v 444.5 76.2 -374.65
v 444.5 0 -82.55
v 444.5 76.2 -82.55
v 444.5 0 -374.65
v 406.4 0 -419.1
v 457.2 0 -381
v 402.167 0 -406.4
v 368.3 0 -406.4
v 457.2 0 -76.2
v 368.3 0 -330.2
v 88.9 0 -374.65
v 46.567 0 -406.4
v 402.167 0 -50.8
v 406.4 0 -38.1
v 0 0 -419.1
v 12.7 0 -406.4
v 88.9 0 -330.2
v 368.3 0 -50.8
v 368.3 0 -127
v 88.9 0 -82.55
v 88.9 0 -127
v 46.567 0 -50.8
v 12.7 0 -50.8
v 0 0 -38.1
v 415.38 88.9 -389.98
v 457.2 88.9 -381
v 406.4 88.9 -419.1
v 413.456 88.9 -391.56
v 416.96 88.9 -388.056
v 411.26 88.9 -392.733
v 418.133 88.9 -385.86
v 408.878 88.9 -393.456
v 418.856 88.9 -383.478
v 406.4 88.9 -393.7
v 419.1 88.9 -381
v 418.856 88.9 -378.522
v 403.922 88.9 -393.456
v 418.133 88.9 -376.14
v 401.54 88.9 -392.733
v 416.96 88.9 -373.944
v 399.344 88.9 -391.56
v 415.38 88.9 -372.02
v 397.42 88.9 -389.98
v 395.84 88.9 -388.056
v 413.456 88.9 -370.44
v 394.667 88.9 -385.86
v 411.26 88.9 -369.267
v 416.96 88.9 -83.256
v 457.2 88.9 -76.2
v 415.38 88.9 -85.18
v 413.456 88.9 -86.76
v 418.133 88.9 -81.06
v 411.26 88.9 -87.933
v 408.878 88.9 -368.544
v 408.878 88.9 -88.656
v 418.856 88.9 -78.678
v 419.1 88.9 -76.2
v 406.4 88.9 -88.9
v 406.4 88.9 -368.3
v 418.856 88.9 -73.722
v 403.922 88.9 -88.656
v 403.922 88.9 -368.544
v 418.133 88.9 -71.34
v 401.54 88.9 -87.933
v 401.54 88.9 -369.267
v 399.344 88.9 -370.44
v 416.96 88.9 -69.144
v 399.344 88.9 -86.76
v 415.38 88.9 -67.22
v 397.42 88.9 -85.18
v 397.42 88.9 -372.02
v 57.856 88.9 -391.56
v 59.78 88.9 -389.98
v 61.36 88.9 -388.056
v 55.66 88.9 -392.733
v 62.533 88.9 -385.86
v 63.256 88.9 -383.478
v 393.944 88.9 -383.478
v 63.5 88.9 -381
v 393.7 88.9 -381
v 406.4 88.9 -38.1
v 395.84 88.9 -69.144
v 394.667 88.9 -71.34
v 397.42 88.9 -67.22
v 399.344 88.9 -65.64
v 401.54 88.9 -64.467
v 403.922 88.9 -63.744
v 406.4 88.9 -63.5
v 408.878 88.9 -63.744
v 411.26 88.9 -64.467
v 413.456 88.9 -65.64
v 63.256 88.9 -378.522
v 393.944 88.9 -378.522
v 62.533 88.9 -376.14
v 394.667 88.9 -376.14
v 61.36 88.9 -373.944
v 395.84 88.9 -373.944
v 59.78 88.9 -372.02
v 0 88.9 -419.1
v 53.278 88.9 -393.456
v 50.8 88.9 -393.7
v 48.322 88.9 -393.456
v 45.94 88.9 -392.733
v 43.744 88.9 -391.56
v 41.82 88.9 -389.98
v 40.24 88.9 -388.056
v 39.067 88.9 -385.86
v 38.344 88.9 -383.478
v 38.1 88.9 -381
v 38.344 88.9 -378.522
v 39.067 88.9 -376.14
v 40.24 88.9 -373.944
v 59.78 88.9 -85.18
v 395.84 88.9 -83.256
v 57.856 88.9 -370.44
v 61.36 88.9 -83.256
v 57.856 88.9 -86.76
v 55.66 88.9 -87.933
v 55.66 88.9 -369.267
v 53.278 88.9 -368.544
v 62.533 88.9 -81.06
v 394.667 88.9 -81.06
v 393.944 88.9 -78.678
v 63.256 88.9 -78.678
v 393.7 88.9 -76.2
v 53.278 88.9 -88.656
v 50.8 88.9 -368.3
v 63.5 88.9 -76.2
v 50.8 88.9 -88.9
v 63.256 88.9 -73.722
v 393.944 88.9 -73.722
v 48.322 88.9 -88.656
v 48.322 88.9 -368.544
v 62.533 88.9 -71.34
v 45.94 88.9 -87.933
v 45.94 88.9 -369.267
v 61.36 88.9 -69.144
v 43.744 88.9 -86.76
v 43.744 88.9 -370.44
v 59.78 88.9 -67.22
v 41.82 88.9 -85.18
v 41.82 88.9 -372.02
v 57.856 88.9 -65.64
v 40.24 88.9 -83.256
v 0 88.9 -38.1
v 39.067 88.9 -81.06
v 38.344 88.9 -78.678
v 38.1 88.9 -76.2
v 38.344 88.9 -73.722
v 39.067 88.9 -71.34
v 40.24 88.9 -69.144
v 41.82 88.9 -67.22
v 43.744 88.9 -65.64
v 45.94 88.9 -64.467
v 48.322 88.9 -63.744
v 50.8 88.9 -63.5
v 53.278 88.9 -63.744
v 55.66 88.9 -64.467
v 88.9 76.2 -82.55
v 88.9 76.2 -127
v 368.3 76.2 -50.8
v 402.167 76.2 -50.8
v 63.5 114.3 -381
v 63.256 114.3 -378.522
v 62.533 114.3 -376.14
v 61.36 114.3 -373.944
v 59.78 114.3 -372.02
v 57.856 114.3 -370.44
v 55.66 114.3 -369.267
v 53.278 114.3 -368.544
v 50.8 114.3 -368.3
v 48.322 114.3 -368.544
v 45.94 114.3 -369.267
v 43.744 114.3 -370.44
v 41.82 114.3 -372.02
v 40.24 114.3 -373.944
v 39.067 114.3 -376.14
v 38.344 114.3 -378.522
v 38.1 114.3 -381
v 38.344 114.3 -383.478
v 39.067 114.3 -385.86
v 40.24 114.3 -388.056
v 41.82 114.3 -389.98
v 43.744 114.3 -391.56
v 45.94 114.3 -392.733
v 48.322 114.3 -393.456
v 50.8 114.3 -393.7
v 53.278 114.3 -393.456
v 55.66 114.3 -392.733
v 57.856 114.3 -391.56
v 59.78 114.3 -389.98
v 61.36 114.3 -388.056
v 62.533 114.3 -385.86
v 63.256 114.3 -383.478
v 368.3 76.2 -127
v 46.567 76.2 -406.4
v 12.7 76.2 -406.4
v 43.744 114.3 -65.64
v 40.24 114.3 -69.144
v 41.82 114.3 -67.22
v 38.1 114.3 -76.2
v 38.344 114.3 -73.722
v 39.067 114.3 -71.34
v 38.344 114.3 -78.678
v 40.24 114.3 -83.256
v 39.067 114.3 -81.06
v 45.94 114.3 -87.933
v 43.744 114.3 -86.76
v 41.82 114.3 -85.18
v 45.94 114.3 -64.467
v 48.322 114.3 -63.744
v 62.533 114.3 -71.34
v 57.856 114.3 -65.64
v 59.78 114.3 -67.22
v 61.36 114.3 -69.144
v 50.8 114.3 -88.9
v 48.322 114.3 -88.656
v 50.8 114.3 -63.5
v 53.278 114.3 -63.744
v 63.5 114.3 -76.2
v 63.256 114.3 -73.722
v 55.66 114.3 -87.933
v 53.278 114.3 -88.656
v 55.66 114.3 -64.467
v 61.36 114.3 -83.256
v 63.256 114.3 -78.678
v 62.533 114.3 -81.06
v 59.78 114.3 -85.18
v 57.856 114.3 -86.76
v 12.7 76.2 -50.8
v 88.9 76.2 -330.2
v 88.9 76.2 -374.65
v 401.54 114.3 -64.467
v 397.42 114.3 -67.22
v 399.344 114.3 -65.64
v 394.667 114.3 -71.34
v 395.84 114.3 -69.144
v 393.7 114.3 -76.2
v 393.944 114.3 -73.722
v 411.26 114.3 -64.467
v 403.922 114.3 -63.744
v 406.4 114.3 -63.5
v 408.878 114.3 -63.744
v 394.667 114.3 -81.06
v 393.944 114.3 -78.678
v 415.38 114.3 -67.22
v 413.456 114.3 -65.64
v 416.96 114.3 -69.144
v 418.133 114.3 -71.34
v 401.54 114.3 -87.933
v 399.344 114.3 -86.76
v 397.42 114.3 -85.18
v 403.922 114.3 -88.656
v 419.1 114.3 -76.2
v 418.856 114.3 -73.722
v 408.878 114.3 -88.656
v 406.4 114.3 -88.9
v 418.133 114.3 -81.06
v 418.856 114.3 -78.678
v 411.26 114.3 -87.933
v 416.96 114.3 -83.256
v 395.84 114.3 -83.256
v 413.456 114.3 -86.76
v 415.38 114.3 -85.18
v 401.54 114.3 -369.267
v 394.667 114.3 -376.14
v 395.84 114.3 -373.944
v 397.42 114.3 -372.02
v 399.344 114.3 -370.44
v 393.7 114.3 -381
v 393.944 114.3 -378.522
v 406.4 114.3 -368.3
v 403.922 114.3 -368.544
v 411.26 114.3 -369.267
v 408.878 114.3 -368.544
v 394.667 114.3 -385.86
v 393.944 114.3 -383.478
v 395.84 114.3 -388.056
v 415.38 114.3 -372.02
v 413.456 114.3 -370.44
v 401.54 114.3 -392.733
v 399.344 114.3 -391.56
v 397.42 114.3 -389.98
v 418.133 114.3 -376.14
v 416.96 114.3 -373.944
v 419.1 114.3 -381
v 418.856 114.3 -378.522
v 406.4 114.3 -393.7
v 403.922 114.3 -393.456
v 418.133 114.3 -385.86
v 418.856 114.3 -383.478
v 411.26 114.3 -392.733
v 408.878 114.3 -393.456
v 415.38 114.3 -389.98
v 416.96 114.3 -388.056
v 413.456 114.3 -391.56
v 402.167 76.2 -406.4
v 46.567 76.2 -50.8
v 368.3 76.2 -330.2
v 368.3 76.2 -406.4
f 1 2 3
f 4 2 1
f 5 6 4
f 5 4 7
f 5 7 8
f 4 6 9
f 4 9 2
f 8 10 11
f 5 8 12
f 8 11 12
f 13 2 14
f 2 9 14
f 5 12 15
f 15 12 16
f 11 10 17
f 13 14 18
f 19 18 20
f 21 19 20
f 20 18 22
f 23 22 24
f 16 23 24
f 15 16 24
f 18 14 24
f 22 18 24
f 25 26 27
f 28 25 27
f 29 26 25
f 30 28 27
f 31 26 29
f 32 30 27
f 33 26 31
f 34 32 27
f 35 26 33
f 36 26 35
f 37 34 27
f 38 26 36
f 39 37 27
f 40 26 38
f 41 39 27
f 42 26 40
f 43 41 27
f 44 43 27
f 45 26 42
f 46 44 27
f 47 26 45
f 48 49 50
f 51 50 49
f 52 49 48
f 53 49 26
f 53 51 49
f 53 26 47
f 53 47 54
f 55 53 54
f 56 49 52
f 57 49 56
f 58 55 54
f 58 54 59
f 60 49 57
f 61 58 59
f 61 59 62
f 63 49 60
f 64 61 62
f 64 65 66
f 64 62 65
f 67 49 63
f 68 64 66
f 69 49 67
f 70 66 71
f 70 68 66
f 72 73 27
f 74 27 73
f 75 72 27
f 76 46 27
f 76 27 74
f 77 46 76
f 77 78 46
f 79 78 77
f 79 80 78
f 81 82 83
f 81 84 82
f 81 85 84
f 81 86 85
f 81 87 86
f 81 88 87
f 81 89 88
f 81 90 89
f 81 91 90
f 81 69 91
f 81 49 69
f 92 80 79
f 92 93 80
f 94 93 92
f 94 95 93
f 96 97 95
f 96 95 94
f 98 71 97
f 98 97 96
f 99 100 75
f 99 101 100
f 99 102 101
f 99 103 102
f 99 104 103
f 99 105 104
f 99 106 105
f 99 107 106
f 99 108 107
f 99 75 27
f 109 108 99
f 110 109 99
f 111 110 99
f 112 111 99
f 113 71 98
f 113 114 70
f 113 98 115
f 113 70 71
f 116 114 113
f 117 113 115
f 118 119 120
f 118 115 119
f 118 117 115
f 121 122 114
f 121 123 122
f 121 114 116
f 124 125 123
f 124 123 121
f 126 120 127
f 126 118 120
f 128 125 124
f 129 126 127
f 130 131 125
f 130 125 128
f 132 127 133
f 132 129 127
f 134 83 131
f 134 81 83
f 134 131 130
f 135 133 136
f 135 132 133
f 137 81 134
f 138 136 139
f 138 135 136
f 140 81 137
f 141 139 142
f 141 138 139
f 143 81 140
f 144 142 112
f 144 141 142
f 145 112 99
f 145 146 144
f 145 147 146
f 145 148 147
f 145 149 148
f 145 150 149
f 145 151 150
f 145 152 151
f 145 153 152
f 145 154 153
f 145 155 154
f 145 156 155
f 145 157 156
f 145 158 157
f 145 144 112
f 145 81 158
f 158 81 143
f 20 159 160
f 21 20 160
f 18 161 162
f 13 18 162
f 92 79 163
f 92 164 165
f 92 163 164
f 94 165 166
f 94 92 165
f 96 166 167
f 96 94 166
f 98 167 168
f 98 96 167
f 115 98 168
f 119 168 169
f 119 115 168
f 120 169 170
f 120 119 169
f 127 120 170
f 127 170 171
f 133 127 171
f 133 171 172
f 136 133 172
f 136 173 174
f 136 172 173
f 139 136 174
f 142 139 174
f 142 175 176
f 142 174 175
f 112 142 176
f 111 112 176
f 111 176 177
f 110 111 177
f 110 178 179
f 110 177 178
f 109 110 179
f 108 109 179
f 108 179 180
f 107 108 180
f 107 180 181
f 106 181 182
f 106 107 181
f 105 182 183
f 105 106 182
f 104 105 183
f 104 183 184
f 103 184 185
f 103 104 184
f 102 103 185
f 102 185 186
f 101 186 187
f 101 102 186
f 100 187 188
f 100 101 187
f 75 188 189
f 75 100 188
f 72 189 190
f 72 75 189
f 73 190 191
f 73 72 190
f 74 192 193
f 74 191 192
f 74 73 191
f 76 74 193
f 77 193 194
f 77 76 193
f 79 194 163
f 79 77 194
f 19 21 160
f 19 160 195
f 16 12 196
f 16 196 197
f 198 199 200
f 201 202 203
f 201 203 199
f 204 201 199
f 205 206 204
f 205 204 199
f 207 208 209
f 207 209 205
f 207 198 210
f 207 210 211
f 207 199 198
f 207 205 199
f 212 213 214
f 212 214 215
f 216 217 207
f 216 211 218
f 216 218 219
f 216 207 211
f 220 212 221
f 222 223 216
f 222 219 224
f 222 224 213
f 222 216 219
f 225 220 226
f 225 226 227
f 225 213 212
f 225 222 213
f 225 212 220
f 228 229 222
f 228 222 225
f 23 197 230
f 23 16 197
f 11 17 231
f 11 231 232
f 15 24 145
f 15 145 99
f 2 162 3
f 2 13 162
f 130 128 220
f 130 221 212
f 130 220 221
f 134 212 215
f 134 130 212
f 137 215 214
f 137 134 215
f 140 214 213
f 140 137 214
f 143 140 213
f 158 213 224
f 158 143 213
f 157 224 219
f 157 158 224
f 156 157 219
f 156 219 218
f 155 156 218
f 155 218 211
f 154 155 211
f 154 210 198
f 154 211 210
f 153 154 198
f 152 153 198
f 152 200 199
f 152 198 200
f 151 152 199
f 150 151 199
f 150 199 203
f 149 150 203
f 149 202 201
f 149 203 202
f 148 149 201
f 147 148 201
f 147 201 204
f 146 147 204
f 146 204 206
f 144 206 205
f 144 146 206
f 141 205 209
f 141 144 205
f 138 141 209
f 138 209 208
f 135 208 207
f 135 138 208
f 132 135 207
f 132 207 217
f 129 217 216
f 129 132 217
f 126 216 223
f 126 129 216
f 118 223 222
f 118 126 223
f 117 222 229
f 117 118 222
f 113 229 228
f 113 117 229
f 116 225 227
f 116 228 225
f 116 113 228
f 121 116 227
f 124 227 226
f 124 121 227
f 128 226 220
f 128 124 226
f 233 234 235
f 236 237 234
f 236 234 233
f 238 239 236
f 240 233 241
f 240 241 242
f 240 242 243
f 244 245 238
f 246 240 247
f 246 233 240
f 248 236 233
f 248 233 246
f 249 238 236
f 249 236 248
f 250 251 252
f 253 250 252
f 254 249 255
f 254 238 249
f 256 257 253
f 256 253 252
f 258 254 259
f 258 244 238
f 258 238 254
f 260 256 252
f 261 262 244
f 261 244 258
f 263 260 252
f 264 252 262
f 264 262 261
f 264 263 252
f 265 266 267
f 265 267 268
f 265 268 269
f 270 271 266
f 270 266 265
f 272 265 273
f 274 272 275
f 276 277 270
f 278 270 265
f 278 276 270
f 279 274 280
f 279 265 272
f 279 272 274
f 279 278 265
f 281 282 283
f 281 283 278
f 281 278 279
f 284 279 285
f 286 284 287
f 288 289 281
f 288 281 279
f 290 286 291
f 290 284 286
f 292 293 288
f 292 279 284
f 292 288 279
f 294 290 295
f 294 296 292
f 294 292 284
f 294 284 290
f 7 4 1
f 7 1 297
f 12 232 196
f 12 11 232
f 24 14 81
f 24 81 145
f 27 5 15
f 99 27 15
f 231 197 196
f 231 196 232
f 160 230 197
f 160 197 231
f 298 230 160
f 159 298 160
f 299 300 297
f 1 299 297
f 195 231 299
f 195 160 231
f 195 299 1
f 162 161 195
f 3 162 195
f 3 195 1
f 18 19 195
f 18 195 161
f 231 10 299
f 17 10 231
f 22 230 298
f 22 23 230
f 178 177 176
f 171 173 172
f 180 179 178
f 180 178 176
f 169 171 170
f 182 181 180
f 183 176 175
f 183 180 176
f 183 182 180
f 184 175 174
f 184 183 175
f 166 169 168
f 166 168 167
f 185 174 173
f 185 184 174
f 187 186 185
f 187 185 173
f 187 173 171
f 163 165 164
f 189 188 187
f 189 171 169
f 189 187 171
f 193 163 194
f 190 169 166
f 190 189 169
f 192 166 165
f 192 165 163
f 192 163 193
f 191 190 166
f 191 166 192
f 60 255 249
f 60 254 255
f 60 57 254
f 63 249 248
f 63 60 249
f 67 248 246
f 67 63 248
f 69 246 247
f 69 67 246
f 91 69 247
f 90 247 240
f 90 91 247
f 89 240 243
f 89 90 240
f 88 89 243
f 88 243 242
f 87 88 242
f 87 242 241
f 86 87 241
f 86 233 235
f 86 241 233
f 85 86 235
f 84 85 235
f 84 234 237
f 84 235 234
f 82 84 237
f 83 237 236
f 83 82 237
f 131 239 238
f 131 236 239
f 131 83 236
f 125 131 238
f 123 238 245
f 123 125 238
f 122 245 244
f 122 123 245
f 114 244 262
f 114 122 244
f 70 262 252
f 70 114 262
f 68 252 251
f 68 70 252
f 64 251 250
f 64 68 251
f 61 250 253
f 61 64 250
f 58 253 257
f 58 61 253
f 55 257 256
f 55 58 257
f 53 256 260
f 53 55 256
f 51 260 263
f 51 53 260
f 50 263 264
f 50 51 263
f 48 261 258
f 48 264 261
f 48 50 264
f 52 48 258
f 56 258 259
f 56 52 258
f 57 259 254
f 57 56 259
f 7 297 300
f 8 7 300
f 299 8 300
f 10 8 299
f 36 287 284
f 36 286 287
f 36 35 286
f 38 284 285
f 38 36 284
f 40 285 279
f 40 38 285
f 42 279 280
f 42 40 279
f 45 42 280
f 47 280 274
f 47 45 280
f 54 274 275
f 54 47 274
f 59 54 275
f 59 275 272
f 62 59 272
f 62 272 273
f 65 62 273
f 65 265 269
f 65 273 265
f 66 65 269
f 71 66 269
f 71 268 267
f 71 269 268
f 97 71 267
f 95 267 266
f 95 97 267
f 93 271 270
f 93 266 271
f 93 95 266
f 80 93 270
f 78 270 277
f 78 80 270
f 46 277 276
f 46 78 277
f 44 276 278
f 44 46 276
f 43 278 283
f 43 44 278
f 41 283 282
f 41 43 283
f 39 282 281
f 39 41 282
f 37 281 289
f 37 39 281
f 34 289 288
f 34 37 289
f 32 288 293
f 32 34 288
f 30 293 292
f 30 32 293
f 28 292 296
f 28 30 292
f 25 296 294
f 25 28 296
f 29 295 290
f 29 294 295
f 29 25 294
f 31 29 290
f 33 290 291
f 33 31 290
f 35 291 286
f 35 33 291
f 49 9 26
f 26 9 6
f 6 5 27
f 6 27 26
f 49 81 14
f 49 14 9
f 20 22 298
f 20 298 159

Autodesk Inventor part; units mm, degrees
ref_plane "YZ Plane" through (0, 0, 0) normal (1, 0, 0) x (0, 1, 0)
ref_plane "XZ Plane" through (0, 0, 0) normal (0, 1, 0) x (-1, 0, 0)
ref_plane "XY Plane" through (0, 0, 0) normal (0, 0, 1) x (1, 0, 0)
sketch "Sketch1" plane through (0, 0, 0) normal (0, 1, 0) x (-1, 0, 0)
  line L0 (0, 0) -> (-457.2, 0) construction
  line L1 (-457.2, -457.2) -> (0, -457.2) construction
  line L2 (0, -457.2) -> (0, 0) construction
  line L3 (0, 0) -> (0, -38.1) construction
  line L4 (0, -457.2) -> (0, -419.1) construction
  line L5 (0, -38.1) -> (0, -371.3712)
  line L6 (-457.2, -76.2) -> (-457.2, -381)
  line L7 (0, -371.3712) -> (0, -419.1)
  line L8 (-406.4, -38.1) -> (-457.2, -76.2)
  line L9 (-406.4, -419.1) -> (-457.2, -381)
  line L10 (-457.2, 0) -> (-457.2, -38.1) construction
  line L11 (-457.2, -76.2) -> (-457.2, -457.2) construction
  line L12 (-444.5, -82.55) -> (-444.5, -374.65)
  line L13 (-444.5, -374.65) -> (-402.1667, -406.4)
  line L14 (-12.7, -406.4) -> (-12.7, -371.3712)
  line L15 (-12.7, -371.3712) -> (-12.7, -50.8)
  line L16 (-402.1667, -50.8) -> (-444.5, -82.55)
  line L17 (-444.5, -82.55) -> (-444.5, -374.65)
  line L18 (-444.5, -374.65) -> (-402.1667, -406.4)
  line L19 (-12.7, -406.4) -> (-12.7, -371.3712)
  line L20 (-12.7, -371.3712) -> (-12.7, -50.8)
  line L21 (-402.1667, -50.8) -> (-444.5, -82.55)
  line L22 (-444.5, -82.55) -> (-444.5, -374.65)
  line L23 (-12.7, -406.4) -> (-12.7, -50.8)
  line L24 (-444.5, -82.55) -> (-444.5, -374.65)
  line L25 (-402.1667, -50.8) -> (-12.7, -50.8)
  line L26 (-406.4, -38.1) -> (0, -38.1)
  line L27 (-406.4, -419.1) -> (0, -419.1)
  line L28 (-402.1667, -406.4) -> (-12.7, -406.4)
  dimension "d0" = 457.2
  dimension "d1" = 457.2
  dimension "d12" = 12.7
  dimension "d13" = 12.7
extrude "Extrusion1" add sketch "Sketch1" along normal blind 88.9 contours L5 L7 L27 L9 L6 L8 L26 | L16 L25 L15 L14 L28 L13 L12
sketch "Sketch2" plane through (0, 0, 0) normal (0, -1, 0) x (1, 0, 0)
  line L0 (0, -38.1) -> (0, -419.1) projected
  line L1 (406.4, -419.1) -> (457.2, -381) projected
  line L2 (457.2, -381) -> (457.2, -76.2) projected
  line L3 (457.2, -76.2) -> (406.4, -38.1) projected
  line L4 (402.1667, -50.8) -> (444.5, -82.55)
  line L5 (444.5, -82.55) -> (444.5, -374.65)
  line L6 (444.5, -374.65) -> (402.1667, -406.4)
  line L7 (402.1667, -406.4) -> (368.3, -406.4)
  line L8 (368.3, -406.4) -> (368.3, -330.2)
  line L9 (368.3, -330.2) -> (88.9, -330.2)
  line L10 (88.9, -330.2) -> (88.9, -374.65)
  line L11 (88.9, -374.65) -> (46.5667, -406.4)
  line L12 (46.5667, -406.4) -> (12.7, -406.4)
  line L13 (12.7, -406.4) -> (12.7, -50.8)
  line L14 (12.7, -50.8) -> (46.5667, -50.8)
  line L15 (46.5667, -50.8) -> (88.9, -82.55)
  line L16 (88.9, -82.55) -> (88.9, -127)
  line L17 (88.9, -127) -> (368.3, -127)
  line L18 (368.3, -127) -> (368.3, -50.8)
  line L19 (368.3, -50.8) -> (402.1667, -50.8)
  line L20 (0, -419.1) -> (406.4, -419.1) projected
  line L21 (406.4, -38.1) -> (0, -38.1) projected
  point P0 (0, 0)
  dimension "d14" = 12.7
extrude "Extrusion2" cut sketch "Sketch2" against normal blind 76.2 contours L4 L5 L6 L7 L8 L9 L10 L11 L12 L13 L14 L15 L16 L17 L18 L19
sketch "Sketch3" plane through (0, 88.9, 0) normal (0, 1, 0) x (1, 0, 0)
  line L0 (0, 419.1) -> (0, 38.1) projected
  line L1 (406.4, 38.1) -> (457.2, 76.2) projected
  line L2 (457.2, 76.2) -> (457.2, 381) projected
  line L3 (457.2, 381) -> (406.4, 419.1) projected
  circle A0 centre (50.8, 76.2) radius 12.7
  circle A1 centre (50.8, 381) radius 12.7
  circle A2 centre (406.4, 381) radius 12.7
  circle A3 centre (406.4, 76.2) radius 12.7
  line L4 (0, 38.1) -> (406.4, 38.1) projected
  line L5 (406.4, 419.1) -> (0, 419.1) projected
  point P0 (0, 0)
  dimension "d17" = 25.4
  dimension "d18" = 25.4
  dimension "d19" = 25.4
  dimension "d20" = 25.4
extrude "Extrusion3" add sketch "Sketch3" along normal blind 25.4 contours A0 | A1 | A2 | A3
properties part number "Body Base" material "Aluminum 6061"
